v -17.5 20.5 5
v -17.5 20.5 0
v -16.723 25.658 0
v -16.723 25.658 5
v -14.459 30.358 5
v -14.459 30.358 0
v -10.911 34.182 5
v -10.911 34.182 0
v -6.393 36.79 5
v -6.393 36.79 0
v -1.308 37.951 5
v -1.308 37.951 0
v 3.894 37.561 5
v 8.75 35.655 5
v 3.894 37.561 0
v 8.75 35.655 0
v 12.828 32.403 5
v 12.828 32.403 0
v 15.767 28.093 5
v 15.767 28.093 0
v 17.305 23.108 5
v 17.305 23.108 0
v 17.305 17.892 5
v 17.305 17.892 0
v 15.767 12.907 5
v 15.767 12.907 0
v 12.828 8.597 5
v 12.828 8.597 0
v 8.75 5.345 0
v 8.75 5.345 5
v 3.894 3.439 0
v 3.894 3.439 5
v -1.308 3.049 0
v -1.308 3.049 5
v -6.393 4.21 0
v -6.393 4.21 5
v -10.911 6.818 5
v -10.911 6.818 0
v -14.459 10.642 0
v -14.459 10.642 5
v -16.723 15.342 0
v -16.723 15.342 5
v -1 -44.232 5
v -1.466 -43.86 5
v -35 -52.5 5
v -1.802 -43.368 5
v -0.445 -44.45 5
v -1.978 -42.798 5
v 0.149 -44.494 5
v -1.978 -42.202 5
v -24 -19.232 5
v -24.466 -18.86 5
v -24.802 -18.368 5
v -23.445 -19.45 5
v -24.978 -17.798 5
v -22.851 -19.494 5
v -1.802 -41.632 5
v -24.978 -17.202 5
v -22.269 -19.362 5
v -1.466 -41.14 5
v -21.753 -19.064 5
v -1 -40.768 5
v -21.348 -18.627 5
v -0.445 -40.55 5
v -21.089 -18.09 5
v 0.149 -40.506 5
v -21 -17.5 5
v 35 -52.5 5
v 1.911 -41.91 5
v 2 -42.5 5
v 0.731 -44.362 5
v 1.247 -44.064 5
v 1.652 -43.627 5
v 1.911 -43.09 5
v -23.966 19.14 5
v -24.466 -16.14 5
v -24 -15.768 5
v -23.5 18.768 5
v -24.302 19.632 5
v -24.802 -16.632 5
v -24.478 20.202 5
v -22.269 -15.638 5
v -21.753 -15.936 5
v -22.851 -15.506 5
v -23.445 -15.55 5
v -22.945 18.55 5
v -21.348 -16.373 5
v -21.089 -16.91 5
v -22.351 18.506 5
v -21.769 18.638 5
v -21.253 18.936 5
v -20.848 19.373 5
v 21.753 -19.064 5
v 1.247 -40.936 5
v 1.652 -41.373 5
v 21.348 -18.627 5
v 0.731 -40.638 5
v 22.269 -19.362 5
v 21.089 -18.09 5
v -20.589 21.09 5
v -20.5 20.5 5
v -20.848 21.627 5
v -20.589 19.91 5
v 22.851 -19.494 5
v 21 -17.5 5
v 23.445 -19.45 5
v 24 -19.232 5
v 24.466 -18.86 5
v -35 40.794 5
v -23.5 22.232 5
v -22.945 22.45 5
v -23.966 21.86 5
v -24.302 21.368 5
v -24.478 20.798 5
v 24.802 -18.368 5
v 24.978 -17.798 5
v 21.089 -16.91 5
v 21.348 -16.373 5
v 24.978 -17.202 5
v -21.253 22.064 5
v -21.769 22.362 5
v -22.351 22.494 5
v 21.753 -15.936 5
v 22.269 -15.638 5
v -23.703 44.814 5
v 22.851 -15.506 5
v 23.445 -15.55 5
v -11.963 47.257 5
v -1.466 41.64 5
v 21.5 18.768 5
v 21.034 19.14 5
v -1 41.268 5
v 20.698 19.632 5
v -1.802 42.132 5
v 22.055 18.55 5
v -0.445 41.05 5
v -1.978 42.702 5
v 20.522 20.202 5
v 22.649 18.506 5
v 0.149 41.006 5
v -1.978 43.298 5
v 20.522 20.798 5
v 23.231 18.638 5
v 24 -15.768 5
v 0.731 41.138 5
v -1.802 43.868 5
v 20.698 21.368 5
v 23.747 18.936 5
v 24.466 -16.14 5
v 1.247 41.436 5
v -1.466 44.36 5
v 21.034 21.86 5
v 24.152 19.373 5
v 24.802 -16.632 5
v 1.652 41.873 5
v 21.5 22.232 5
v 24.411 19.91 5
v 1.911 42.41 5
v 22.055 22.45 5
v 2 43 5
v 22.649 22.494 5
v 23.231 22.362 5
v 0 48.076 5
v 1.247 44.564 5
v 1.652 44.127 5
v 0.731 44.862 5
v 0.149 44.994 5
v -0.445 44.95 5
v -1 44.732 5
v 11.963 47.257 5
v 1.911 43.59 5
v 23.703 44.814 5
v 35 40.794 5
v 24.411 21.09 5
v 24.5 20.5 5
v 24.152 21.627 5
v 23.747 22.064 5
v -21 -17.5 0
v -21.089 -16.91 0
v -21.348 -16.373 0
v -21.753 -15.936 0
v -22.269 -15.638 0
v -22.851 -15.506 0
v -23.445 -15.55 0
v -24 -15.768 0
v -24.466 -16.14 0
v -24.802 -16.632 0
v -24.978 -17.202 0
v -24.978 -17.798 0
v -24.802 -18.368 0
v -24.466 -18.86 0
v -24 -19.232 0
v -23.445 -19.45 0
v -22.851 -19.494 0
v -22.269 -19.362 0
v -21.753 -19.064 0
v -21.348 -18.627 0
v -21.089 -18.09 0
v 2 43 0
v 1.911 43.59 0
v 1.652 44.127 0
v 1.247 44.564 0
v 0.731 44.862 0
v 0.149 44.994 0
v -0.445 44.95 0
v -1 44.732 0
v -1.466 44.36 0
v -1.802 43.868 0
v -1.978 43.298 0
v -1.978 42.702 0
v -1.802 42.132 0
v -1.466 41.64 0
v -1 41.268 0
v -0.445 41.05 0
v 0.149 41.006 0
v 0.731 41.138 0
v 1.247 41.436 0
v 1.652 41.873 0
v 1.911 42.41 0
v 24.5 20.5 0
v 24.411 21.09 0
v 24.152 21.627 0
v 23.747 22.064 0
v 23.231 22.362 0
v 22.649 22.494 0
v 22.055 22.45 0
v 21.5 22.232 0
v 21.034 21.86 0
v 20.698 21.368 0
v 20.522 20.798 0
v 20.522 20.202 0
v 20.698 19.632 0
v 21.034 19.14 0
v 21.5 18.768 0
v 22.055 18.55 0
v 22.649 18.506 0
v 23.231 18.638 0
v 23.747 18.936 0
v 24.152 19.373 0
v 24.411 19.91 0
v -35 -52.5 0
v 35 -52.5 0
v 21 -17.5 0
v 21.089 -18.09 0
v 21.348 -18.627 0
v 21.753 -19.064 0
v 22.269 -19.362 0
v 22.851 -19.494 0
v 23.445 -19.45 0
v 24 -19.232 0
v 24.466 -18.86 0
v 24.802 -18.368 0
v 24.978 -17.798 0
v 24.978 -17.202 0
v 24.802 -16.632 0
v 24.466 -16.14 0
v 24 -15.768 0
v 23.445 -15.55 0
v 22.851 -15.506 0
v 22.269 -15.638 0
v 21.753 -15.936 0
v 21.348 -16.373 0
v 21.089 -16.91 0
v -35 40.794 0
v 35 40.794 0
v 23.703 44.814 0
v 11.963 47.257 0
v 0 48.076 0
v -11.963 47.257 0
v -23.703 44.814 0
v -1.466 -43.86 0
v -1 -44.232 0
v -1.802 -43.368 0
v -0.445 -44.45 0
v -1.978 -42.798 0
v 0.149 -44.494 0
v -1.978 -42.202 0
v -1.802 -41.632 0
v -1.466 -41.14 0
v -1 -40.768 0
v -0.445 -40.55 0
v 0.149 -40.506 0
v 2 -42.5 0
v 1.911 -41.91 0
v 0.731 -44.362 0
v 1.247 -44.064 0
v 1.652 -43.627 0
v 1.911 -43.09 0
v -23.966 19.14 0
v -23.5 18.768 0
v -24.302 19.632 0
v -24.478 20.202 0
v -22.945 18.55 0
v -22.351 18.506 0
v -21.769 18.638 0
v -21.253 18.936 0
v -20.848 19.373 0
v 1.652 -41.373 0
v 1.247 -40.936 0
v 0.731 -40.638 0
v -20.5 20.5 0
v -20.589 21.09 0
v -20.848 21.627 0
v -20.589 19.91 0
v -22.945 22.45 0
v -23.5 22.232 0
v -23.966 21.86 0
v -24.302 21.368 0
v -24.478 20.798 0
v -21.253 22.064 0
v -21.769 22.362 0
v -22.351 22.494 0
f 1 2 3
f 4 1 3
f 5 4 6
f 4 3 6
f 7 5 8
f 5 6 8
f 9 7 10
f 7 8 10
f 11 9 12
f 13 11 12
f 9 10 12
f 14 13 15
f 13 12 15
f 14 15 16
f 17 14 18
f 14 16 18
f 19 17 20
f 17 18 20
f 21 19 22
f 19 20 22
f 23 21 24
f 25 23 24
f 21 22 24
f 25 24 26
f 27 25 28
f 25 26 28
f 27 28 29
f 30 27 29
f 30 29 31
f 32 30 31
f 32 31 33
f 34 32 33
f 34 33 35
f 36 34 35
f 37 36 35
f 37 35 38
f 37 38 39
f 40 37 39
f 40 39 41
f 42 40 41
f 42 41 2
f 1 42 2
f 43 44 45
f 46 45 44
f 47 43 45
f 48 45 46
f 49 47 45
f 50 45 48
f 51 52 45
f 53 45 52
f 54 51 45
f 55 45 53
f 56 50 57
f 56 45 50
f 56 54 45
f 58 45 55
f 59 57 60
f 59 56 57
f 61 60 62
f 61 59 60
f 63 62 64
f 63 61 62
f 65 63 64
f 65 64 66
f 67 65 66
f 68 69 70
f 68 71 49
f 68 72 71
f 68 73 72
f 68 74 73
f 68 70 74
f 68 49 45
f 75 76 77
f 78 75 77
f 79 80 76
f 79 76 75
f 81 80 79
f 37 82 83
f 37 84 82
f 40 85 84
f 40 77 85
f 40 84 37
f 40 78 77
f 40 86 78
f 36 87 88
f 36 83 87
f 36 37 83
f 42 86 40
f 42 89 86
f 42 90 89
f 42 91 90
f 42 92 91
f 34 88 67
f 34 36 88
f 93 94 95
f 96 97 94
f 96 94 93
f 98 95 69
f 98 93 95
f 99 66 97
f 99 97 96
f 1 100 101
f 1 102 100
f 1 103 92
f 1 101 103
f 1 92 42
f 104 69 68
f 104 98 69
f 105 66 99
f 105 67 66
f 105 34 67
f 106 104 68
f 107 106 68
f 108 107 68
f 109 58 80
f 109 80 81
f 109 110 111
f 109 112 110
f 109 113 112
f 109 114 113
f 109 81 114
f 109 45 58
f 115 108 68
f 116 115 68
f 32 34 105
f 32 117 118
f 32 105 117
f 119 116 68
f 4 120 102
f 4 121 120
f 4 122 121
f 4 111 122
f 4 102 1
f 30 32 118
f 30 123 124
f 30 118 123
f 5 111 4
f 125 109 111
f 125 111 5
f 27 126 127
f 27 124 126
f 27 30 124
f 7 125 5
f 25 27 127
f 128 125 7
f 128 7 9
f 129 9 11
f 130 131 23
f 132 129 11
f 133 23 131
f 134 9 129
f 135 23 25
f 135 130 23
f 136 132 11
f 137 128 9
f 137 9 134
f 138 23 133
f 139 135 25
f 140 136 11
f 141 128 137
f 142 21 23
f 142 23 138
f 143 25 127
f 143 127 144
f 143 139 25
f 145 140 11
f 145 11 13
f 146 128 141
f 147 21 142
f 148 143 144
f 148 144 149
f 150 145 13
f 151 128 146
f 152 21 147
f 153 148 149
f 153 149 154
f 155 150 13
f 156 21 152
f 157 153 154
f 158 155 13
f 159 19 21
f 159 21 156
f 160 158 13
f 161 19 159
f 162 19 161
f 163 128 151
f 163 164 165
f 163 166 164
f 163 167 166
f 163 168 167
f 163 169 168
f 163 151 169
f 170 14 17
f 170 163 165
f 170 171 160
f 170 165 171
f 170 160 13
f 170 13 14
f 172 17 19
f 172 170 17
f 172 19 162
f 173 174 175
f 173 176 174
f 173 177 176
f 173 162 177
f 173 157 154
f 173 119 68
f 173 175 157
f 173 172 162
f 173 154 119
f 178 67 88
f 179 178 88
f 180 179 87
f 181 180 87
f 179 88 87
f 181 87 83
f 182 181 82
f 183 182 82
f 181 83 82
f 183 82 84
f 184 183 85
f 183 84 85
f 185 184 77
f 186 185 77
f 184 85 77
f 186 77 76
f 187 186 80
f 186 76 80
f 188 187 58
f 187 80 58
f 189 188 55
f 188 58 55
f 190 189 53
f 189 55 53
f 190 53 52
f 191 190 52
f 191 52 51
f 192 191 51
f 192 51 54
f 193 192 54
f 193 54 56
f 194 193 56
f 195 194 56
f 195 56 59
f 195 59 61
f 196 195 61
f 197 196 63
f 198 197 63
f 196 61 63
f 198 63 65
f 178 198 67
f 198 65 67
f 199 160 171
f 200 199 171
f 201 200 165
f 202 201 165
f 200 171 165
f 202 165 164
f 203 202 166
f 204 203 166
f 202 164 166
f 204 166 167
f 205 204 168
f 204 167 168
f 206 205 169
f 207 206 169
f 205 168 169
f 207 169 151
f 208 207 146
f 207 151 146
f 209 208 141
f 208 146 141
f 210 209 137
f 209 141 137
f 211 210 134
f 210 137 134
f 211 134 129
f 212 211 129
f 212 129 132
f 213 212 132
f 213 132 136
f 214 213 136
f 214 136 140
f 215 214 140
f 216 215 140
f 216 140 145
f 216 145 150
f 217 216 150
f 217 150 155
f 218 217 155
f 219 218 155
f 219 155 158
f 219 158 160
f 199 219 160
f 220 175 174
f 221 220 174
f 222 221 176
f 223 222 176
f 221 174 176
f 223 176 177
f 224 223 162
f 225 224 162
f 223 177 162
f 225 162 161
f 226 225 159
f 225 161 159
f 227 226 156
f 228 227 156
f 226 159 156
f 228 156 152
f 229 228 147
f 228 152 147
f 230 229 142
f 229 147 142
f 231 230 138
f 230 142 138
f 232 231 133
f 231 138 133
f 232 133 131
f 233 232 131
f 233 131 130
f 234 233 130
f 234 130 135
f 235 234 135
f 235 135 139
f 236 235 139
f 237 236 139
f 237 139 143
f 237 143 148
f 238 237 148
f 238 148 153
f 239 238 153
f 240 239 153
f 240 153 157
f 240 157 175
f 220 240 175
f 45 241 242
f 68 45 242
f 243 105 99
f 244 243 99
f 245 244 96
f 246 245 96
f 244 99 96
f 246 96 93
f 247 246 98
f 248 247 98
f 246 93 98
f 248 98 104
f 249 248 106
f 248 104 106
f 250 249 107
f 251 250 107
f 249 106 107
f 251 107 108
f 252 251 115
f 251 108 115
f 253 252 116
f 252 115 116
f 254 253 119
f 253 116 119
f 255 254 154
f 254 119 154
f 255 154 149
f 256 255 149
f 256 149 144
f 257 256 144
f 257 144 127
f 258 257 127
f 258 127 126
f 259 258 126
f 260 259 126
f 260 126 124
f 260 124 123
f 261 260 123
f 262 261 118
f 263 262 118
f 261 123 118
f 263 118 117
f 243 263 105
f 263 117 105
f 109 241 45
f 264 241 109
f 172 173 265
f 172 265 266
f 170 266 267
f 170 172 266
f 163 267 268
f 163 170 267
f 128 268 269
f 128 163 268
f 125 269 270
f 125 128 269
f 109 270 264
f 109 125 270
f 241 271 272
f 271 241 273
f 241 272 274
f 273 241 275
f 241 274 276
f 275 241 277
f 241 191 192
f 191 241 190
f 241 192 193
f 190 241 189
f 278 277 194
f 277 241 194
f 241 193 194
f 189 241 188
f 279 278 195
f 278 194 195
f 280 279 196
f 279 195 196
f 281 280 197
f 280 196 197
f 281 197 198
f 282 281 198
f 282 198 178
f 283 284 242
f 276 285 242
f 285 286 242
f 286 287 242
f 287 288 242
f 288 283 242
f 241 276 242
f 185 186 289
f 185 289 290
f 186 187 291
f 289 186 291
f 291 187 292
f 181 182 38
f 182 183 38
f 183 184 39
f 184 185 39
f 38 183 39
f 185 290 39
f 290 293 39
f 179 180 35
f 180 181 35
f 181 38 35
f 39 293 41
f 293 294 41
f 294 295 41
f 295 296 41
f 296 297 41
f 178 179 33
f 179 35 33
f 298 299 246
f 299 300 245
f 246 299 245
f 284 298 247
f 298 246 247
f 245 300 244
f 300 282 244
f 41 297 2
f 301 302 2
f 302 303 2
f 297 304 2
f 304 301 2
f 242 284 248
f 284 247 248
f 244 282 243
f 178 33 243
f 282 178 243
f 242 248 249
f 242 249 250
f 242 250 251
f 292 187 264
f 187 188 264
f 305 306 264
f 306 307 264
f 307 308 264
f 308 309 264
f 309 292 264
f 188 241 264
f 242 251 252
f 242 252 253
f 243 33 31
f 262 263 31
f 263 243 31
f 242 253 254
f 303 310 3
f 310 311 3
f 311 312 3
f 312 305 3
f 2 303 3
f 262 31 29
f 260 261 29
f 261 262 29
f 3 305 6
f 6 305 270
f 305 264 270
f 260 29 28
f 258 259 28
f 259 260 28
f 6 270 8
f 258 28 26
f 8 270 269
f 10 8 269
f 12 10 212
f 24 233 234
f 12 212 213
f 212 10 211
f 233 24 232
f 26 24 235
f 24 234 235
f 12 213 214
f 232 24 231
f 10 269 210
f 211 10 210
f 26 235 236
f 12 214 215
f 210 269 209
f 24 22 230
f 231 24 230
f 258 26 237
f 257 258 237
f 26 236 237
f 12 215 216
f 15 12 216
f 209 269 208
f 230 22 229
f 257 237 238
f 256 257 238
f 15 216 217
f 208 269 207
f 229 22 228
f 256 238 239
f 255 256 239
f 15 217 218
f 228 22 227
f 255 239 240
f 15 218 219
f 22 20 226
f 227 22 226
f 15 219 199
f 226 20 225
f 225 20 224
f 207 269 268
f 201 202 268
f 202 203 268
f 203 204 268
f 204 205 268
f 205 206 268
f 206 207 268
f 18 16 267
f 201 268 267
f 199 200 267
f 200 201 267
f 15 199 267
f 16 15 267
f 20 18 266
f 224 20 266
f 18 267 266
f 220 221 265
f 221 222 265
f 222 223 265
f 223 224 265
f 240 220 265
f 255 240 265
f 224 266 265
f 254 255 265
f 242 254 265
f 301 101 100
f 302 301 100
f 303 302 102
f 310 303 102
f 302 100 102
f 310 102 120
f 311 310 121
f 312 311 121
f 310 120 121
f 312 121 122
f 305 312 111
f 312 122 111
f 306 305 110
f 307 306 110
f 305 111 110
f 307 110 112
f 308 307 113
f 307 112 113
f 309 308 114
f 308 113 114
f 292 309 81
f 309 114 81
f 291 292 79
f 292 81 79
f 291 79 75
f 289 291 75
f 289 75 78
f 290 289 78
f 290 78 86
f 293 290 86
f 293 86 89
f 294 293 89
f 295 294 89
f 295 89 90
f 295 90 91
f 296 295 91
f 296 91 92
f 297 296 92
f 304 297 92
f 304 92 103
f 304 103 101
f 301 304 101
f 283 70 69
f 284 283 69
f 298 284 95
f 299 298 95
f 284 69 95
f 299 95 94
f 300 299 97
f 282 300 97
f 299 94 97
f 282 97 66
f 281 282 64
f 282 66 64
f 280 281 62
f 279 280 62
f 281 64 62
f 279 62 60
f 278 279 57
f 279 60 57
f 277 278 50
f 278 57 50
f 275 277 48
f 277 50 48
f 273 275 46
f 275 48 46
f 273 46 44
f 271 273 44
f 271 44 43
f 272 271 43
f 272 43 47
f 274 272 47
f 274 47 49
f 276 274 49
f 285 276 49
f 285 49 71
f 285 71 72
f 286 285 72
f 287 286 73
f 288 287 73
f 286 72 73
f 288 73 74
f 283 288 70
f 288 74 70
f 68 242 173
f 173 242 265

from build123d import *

# Parameters (mm, degrees)
SKETCH1_W           = 70
SKETCH1_H           = 105
BOSS_EXTRUDE1_DEPTH = 5
SKETCH2_R           = 17.5
CUT_EXTRUDE3_DEPTH  = 64.294944506
SKETCH3_R           = 2
CUT_EXTRUDE4_DEPTH  = 64.294944506
SKETCH4_R           = 2
CUT_EXTRUDE5_DEPTH  = 5
CUT_EXTRUDE6_DEPTH  = 10


with BuildPart() as part:
    # Sketch1 → Boss-Extrude1 (new body)
    with BuildSketch(Plane.XY):
        Rectangle(SKETCH1_W, SKETCH1_H)
    extrude(amount=BOSS_EXTRUDE1_DEPTH)

    # Sketch2 → Cut-Extrude3 (cut, through all)
    with BuildSketch(Plane(origin=(0, 0, 0), x_dir=(-1, 0, 0), z_dir=(0, 0, -1))):
        with Locations((0, 20.5)):
            Circle(SKETCH2_R)
    extrude(amount=-CUT_EXTRUDE3_DEPTH, mode=Mode.SUBTRACT)

    # Sketch3 → Cut-Extrude4 (cut, through all)
    with BuildSketch(Plane.XY.offset(5)):
        with Locations((-22.5, 20.5)):
            Circle(SKETCH3_R)
        with Locations((0, 43)):
            Circle(SKETCH3_R)
        with Locations((22.5, 20.5)):
            Circle(SKETCH3_R)
    extrude(amount=-CUT_EXTRUDE4_DEPTH, mode=Mode.SUBTRACT)

    # Sketch4 → Cut-Extrude5 (cut)
    with BuildSketch(Plane.XY.offset(5)):
        with Locations((0, -42.5)):
            Circle(SKETCH4_R)
        with Locations((-23, -17.5)):
            Circle(SKETCH4_R)
        with Locations(Location((23, -17.5, 0), (0, 0, 180))):
            Circle(SKETCH4_R)
    extrude(amount=-CUT_EXTRUDE5_DEPTH, mode=Mode.SUBTRACT)

    # Sketch5 → Cut-Extrude6 (cut)
    with BuildSketch(Plane.XY.offset(5)):
        with BuildLine():
            Line((-35, 40.793543502), (-35, 52.5))
            Line((-35, 52.5), (35, 52.5))
            Line((35, 52.5), (35, 40.793543502))
            ThreePointArc((35, 40.793543502), (0, 48.07644174), (-35, 40.793543502))
        make_face()
    extrude(amount=-CUT_EXTRUDE6_DEPTH, mode=Mode.SUBTRACT)


solid = part.part
